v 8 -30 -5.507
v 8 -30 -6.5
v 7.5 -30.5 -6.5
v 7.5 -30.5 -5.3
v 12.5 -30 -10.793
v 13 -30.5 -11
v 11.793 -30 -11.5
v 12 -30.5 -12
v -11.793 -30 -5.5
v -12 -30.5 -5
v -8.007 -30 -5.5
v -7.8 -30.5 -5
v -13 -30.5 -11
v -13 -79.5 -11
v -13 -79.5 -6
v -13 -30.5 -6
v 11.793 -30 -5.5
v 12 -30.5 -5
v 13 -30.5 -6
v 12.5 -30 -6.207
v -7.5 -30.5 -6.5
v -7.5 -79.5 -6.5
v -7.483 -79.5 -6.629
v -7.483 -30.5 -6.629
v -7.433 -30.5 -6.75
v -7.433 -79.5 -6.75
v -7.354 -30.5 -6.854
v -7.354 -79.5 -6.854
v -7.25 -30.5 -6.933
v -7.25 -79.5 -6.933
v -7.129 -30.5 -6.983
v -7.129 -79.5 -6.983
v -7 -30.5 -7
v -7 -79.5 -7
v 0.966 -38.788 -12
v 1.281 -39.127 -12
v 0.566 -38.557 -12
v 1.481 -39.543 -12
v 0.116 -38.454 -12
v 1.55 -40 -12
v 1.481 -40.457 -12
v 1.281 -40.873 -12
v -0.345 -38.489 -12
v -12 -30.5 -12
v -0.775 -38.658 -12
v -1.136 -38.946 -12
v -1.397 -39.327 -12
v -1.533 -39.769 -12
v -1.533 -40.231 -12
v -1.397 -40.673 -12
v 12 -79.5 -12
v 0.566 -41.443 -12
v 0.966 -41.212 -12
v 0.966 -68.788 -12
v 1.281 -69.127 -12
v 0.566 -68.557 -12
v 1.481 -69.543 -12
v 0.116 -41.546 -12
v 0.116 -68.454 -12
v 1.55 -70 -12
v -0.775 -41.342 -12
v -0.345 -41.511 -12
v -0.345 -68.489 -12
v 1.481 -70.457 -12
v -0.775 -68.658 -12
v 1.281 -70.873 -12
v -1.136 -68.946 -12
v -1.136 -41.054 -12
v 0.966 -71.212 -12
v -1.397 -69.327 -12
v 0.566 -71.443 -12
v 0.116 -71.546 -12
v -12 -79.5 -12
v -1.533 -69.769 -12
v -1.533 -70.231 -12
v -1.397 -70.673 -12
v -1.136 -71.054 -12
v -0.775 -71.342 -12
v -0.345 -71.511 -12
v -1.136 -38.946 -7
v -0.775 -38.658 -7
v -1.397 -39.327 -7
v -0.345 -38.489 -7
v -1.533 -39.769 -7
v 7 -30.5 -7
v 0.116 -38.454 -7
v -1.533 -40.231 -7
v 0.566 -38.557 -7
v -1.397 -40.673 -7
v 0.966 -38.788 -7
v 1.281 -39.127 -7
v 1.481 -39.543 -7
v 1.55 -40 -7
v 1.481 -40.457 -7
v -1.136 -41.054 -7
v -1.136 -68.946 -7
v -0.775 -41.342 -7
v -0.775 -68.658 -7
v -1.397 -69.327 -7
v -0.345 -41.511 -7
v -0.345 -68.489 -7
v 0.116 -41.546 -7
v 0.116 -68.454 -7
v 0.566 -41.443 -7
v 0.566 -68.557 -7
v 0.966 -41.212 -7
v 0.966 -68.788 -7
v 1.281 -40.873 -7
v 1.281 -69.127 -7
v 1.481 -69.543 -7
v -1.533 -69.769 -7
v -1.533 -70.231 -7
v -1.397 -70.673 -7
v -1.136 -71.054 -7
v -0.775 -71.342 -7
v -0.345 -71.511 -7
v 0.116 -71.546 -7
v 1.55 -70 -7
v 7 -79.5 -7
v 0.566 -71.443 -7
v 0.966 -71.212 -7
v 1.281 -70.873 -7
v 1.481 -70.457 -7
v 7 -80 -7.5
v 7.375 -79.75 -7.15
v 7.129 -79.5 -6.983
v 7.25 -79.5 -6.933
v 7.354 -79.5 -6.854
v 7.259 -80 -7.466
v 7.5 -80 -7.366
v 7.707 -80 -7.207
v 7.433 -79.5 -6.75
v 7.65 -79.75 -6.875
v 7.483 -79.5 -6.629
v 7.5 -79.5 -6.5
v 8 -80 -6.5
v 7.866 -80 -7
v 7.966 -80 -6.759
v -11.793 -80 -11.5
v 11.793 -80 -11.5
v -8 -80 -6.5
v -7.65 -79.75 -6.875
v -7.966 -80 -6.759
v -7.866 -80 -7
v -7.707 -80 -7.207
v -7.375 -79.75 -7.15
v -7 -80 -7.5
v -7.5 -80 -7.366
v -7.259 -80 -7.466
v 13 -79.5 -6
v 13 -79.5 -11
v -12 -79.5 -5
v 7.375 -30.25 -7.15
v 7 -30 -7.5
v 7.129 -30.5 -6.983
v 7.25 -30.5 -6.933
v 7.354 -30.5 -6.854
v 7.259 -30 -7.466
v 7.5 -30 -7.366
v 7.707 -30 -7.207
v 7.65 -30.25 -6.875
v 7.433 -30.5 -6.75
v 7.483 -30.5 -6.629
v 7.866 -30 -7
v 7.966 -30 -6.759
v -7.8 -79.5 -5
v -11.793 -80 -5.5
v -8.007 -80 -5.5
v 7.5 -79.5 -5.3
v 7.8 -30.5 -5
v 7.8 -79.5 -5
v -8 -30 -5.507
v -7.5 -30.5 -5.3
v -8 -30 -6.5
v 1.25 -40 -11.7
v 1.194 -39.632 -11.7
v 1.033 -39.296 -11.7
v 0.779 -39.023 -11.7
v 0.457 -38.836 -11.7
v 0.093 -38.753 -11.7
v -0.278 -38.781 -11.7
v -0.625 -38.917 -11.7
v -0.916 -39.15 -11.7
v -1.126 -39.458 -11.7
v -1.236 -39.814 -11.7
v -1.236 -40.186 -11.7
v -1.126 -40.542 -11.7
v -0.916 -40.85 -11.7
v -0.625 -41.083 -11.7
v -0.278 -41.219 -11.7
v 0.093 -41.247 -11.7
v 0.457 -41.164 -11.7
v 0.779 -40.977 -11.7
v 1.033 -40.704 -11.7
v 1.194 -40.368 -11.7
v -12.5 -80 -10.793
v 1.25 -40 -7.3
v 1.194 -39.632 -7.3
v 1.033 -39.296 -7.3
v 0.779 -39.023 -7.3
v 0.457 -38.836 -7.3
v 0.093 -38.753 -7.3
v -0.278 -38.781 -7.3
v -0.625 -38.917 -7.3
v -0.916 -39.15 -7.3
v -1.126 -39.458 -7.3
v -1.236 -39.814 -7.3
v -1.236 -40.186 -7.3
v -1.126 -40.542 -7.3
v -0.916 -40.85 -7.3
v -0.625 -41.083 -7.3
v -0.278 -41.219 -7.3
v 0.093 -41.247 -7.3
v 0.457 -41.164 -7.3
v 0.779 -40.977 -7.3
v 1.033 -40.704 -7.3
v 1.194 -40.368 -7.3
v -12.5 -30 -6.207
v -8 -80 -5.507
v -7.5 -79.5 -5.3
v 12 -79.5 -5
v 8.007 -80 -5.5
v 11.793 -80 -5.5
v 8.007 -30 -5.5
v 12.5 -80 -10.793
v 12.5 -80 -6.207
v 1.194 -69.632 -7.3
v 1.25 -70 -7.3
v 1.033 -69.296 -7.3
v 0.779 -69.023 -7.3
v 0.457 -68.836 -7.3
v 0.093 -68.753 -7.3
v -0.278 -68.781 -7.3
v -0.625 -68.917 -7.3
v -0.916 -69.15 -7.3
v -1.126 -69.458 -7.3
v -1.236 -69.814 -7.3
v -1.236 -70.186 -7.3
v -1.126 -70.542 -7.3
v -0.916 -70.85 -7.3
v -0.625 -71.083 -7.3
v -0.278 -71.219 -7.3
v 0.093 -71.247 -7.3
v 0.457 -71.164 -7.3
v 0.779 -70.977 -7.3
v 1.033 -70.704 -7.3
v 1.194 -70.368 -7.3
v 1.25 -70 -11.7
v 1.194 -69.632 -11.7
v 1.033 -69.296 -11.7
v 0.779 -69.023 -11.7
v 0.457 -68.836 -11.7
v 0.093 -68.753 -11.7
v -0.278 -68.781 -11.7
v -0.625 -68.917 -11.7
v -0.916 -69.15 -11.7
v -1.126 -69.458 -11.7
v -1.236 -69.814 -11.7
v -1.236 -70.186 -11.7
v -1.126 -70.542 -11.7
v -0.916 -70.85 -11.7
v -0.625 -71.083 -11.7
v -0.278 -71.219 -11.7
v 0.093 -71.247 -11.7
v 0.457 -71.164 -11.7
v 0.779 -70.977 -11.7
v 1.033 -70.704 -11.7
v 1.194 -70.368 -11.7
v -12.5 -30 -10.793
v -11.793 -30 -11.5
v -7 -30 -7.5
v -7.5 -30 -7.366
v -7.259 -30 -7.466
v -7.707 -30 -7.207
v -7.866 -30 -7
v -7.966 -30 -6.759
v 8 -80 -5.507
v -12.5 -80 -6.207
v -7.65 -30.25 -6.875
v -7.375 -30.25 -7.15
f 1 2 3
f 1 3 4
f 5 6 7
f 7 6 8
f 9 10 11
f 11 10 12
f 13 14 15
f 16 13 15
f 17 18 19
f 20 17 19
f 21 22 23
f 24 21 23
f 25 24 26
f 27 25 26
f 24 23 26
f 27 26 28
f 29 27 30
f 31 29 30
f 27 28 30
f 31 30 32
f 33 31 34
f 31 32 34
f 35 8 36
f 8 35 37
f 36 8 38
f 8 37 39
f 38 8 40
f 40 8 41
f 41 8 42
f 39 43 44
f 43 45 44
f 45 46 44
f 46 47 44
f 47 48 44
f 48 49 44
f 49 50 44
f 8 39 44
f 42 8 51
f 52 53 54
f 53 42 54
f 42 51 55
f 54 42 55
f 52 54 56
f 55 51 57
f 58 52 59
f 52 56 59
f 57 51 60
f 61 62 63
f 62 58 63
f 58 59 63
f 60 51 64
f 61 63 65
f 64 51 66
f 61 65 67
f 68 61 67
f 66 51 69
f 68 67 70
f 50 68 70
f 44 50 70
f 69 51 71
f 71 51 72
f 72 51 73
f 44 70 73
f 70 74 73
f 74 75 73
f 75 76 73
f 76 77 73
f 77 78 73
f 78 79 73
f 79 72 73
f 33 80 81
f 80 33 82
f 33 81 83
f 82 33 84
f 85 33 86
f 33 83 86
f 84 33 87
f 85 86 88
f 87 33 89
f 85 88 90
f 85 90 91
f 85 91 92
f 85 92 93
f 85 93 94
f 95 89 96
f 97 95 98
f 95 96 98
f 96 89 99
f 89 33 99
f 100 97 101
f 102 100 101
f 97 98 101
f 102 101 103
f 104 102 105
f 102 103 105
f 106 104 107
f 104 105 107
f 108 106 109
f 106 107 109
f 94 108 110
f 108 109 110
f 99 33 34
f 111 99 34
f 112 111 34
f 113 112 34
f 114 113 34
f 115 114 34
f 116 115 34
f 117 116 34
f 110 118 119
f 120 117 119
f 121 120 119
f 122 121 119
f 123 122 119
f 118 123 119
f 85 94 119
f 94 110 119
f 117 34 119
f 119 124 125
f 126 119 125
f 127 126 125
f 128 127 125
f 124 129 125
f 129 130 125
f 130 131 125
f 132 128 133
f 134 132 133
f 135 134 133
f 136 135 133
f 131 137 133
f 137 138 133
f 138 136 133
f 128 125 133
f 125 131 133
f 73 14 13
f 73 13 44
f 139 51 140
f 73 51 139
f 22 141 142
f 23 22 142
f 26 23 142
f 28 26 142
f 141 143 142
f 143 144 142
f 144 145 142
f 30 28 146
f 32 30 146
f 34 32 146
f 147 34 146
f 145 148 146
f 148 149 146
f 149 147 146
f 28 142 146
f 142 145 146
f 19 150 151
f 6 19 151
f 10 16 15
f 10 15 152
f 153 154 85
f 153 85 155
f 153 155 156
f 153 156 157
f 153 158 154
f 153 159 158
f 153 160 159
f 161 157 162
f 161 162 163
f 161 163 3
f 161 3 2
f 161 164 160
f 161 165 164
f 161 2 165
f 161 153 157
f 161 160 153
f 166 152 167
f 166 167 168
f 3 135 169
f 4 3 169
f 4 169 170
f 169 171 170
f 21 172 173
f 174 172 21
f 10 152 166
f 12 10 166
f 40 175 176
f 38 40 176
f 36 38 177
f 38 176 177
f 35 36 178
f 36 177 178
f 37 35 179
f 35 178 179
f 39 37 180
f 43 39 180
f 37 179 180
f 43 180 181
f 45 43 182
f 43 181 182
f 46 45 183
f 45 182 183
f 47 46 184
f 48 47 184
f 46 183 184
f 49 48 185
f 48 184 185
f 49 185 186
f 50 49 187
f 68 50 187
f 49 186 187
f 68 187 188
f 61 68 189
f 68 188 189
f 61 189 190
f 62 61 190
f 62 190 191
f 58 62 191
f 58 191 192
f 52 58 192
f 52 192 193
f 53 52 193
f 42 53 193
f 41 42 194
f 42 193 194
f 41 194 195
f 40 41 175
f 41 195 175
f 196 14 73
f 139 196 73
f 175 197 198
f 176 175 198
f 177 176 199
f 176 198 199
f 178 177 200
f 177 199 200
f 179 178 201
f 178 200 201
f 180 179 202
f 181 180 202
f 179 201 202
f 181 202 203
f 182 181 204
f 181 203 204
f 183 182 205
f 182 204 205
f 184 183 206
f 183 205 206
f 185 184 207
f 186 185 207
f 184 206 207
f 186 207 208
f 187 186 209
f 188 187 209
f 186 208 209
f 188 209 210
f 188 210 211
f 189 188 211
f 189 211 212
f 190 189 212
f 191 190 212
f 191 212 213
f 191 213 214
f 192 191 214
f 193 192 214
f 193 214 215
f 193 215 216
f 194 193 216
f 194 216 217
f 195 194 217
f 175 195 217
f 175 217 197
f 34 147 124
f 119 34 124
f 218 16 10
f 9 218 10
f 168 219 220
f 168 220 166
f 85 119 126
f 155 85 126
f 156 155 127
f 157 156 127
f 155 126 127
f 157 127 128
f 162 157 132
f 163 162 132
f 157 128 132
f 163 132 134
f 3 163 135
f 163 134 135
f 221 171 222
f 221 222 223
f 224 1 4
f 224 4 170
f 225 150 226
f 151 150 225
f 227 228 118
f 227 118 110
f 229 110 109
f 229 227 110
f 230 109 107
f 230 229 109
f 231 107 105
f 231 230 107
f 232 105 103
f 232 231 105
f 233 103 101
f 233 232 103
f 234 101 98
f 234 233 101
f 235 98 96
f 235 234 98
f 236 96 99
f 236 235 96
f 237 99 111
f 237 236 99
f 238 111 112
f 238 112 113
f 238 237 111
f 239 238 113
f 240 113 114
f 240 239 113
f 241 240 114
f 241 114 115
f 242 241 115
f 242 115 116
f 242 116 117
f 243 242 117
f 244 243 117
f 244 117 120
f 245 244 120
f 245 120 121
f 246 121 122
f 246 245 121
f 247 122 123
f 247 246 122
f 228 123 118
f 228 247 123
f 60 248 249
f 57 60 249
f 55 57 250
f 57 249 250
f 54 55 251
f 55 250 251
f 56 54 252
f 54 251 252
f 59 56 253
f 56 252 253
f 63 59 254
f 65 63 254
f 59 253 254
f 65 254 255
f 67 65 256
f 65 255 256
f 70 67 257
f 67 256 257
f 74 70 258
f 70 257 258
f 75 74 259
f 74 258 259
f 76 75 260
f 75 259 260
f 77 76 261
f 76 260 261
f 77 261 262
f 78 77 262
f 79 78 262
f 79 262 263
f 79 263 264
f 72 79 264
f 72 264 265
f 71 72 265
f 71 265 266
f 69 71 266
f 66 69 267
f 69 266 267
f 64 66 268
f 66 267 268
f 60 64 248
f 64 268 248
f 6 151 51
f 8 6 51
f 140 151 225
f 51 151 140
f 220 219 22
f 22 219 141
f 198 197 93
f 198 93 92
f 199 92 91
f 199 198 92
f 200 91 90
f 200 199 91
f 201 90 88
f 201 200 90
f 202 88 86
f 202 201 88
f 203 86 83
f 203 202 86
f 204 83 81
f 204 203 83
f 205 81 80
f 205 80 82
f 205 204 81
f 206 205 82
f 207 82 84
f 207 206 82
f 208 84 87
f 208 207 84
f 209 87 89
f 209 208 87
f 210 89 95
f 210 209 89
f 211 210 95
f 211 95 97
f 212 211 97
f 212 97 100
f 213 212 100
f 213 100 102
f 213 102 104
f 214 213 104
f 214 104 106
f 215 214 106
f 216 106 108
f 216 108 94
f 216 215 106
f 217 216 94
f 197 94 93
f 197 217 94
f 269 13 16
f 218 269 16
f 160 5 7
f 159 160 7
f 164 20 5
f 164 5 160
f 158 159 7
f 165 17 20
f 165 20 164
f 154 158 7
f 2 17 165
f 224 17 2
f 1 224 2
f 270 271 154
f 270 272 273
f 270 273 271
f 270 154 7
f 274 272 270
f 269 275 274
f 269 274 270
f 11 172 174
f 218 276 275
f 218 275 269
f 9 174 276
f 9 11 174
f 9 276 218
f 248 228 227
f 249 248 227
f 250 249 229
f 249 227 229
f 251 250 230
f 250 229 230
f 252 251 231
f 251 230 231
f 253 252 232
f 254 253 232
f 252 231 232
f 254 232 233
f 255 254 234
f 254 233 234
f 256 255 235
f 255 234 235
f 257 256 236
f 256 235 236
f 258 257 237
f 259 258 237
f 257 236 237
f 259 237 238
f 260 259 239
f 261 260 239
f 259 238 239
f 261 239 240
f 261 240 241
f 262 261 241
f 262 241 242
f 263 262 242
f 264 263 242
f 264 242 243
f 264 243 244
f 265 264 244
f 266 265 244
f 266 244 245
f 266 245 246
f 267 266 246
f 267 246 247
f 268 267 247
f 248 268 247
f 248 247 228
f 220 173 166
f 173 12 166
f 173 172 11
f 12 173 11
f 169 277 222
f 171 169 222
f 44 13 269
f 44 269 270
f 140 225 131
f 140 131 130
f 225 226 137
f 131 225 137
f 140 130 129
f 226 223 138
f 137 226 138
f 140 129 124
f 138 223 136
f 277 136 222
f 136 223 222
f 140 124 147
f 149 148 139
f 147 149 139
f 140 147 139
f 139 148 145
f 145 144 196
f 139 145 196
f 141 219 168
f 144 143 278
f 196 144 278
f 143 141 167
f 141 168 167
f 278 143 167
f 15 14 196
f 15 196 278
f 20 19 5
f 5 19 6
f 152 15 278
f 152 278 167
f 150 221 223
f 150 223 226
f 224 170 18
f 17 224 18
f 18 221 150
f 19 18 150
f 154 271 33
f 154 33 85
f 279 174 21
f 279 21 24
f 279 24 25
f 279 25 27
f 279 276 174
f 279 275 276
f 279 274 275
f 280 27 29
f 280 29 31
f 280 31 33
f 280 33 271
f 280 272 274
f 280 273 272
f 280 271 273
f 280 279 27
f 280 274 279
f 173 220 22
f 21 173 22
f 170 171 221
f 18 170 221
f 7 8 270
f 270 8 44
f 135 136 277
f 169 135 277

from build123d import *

# Parameters (mm, degrees)
PAD003_DEPTH    = 25
SKETCH030_R     = 1.25
POCKET005_DEPTH = 12.001
CHAMFER007_SIZE = 0.3
CHAMFER008_SIZE = 0.5


with BuildPart() as part:
    # Sketch028 → Pad003 (new body, symmetric)
    with BuildSketch(Plane.XZ):
        with BuildLine():
            Line((-7.5, -5), (-7.5, -6.5))
            ThreePointArc((-7.5, -6.5), (-7.353553, -6.853553), (-7, -7))
            Line((-7, -7), (7, -7))
            ThreePointArc((7, -7), (7.353553, -6.853553), (7.5, -6.5))
            Line((7.5, -6.5), (7.5, -5))
            Line((7.5, -5), (12, -5))
            Line((12, -5), (13, -6))
            Line((13, -6), (13, -11))
            Line((13, -11), (12, -12))
            Line((12, -12), (-12, -12))
            Line((-13, -11), (-12, -12))
            Line((-13, -11), (-13, -6))
            Line((-13, -6), (-12, -5))
            Line((-12, -5), (-7.5, -5))
        make_face()
    extrude(amount=PAD003_DEPTH, both=True)

    # Sketch030 → Pocket005 (cut, through all)
    with BuildSketch(Plane.XY):
        with Locations((0, 15)):
            Circle(SKETCH030_R)
        with Locations((0, -15)):
            Circle(SKETCH030_R)
    extrude(amount=-POCKET005_DEPTH, mode=Mode.SUBTRACT)

    # Chamfer007
    chamfer007_edges = [part.edges().sort_by_distance(p)[0] for p in [
        (-7.5, 0, -5),
        (7.5, 0, -5),
        (-1.25, 15, -7),
        (-1.25, -15, -7),
        (-1.25, 15, -12),
        (-1.25, -15, -12),
    ]]
    chamfer(chamfer007_edges, length=CHAMFER007_SIZE)

    # Chamfer008
    chamfer008_edges = [part.edges().sort_by_distance(p)[0] for p in [
        (-9.9, -25, -5),
        (-7.65, -25, -5.15),
        (-12.5, -25, -5.5),
        (-7.5, -25, -5.9),
        (-13, -25, -8.5),
        (-7.353553, -25, -6.853553),
        (-12.5, -25, -11.5),
        (0, -25, -7),
        (0, -25, -12),
        (7.353553, -25, -6.853553),
        (12.5, -25, -11.5),
        (7.5, -25, -5.9),
        (13, -25, -8.5),
        (7.65, -25, -5.15),
        (12.5, -25, -5.5),
        (9.9, -25, -5),
        (-9.9, 25, -5),
        (-7.65, 25, -5.15),
        (-12.5, 25, -5.5),
        (-7.5, 25, -5.9),
        (-13, 25, -8.5),
        (-7.353553, 25, -6.853553),
        (-12.5, 25, -11.5),
        (0, 25, -7),
        (0, 25, -12),
        (7.353553, 25, -6.853553),
        (12.5, 25, -11.5),
        (7.5, 25, -5.9),
        (13, 25, -8.5),
        (7.65, 25, -5.15),
        (12.5, 25, -5.5),
        (9.9, 25, -5),
    ]]
    chamfer(chamfer008_edges, length=CHAMFER008_SIZE)


with BuildPart() as part_1:
    # Body004 placement: moved
    add(part.part.moved(Location((0, -55, 0))))


solid = part_1.part
